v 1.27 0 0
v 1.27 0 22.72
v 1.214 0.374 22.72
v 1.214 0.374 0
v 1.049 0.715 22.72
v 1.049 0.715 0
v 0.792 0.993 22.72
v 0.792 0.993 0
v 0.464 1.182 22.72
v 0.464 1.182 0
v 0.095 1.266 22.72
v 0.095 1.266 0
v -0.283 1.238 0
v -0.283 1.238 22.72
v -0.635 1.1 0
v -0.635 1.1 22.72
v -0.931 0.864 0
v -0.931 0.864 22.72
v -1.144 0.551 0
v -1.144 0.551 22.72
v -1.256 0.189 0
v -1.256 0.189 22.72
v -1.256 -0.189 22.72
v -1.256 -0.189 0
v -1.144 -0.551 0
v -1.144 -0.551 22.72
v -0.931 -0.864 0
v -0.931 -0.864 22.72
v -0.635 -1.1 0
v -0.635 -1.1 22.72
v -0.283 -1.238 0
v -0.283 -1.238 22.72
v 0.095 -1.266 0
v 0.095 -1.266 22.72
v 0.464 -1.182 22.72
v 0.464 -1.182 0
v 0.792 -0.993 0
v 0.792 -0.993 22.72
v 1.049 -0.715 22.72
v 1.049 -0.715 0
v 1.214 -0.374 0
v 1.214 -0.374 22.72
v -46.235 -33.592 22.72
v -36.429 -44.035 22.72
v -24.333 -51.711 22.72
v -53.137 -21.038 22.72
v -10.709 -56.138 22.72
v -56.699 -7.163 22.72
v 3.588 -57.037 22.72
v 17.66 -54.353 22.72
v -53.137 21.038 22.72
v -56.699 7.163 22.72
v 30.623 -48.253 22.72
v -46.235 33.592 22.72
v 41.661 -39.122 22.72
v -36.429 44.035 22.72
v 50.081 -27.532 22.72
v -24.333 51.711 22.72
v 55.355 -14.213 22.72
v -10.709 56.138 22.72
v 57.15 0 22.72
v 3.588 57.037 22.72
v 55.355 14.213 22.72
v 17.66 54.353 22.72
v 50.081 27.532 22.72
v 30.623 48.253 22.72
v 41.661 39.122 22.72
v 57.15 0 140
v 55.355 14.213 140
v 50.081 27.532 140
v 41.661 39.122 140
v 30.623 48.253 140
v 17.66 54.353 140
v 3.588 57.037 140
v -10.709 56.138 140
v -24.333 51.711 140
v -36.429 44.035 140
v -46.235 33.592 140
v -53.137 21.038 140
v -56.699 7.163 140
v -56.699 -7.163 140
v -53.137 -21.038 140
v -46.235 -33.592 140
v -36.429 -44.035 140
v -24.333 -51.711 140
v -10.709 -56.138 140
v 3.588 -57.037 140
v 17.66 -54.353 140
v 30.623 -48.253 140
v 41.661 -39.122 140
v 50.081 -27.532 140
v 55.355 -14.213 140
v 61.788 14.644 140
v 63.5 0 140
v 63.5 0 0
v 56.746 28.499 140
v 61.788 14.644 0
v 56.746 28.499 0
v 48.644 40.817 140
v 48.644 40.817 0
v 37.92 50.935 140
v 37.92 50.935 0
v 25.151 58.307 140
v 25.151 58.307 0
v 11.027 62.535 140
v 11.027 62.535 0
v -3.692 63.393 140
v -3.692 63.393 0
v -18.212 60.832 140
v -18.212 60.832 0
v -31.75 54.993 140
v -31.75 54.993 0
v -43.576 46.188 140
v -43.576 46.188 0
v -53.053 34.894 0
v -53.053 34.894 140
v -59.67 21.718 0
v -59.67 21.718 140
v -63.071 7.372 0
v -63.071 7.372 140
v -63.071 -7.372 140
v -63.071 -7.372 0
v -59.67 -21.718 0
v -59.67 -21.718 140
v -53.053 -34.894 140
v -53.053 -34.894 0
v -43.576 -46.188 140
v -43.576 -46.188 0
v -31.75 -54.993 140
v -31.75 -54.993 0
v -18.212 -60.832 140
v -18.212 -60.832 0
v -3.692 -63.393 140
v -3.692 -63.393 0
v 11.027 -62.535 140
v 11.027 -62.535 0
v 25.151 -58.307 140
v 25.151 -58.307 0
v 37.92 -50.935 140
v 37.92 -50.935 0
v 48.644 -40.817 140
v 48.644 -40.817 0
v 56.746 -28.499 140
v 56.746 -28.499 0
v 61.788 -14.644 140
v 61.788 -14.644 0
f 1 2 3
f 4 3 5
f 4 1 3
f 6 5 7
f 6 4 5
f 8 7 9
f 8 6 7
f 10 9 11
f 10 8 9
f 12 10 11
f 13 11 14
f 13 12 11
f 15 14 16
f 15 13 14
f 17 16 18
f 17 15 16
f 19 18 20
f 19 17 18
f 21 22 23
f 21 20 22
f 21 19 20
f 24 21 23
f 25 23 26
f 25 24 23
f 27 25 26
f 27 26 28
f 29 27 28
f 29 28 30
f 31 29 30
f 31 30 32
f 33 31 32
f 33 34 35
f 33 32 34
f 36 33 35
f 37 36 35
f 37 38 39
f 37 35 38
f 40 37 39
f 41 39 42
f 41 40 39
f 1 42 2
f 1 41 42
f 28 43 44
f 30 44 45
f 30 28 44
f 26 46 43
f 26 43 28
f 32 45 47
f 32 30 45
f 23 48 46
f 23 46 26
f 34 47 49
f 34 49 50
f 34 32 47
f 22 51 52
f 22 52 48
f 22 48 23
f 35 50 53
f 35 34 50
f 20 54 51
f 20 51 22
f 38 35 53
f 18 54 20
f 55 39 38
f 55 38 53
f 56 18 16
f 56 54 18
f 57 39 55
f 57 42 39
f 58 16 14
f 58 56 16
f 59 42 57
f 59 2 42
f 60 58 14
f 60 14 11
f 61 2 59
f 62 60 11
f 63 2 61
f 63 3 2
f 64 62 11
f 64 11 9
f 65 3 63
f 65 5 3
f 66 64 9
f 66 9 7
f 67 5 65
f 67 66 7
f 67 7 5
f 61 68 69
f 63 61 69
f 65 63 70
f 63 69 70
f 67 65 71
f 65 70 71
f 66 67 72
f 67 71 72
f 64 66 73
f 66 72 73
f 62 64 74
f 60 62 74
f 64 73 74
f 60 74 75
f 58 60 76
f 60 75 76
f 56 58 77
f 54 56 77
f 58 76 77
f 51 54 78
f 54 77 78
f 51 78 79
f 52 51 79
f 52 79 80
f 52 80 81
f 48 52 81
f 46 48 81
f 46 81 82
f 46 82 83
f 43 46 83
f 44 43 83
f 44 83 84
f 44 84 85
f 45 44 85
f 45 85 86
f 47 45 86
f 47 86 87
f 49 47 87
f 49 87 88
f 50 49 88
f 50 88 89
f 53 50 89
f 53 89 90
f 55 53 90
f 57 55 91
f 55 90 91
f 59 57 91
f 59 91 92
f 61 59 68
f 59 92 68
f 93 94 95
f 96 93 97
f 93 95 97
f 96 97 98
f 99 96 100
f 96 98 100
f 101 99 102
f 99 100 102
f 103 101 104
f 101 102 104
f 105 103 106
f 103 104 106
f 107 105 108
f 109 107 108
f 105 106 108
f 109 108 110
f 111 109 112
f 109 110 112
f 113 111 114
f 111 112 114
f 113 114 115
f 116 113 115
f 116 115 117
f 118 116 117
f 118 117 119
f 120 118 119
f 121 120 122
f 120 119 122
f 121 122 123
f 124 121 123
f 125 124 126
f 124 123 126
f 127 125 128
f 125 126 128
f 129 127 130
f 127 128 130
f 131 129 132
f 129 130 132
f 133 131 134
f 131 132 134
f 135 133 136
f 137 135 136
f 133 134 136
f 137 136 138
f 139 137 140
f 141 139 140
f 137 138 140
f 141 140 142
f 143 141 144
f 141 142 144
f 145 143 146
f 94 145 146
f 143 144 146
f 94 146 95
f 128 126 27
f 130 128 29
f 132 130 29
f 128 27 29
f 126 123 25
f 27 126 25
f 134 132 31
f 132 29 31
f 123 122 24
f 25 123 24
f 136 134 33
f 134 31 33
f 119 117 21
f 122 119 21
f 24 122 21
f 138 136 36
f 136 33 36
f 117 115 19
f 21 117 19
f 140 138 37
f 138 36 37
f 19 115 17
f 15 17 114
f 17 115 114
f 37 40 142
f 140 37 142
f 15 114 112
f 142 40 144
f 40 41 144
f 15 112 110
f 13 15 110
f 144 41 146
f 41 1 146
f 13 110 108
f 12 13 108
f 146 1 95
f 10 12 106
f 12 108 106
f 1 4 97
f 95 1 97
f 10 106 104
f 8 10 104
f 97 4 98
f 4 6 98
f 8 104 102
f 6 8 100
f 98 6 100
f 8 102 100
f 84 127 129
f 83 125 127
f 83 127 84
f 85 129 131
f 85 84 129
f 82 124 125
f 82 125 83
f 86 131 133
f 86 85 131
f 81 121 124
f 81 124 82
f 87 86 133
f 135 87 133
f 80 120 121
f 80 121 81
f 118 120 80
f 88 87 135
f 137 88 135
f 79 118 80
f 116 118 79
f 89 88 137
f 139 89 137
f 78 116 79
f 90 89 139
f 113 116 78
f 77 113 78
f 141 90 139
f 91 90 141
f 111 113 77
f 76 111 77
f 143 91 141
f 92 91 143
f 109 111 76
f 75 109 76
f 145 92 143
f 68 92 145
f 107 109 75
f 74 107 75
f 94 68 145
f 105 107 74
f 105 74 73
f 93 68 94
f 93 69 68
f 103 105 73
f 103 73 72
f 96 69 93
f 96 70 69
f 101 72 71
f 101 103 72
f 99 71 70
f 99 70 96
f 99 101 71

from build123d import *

# Parameters (mm, degrees)
F0_R     = 63.5
F0_R_2   = 57.15
F1_DEPTH = 140
F2_R     = 57.15
F3_DEPTH = 172.72
F4_DEPTH = 150
F5_R     = 1.27
F6_DEPTH = 140.001


with BuildPart() as f1:
    # F0 (on Top) → F1 (new body)
    with BuildSketch(Plane.XY):
        Circle(F0_R)
        Circle(F0_R_2, mode=Mode.SUBTRACT)
        Circle(F0_R_2)
    extrude(amount=F1_DEPTH)

    # F2 (on Top) → F3 (join)
    with BuildSketch(Plane.XY):
        Circle(F2_R)
    extrude(amount=F3_DEPTH)

    # F4 (cut): faces of the model
    f4_faces = [f1.faces().sort_by_distance(p)[0] for p in [
        (0, 0, 172.72),
        (0, 0, 0),
    ]]
    extrude(f4_faces, amount=-F4_DEPTH, dir=(0, 0, 1), mode=Mode.SUBTRACT)

    # F5 (on Top) → F6 (cut, through all)
    with BuildSketch(Plane.XY):
        Circle(F5_R)
    extrude(amount=F6_DEPTH, mode=Mode.SUBTRACT)


solid = f1.part
